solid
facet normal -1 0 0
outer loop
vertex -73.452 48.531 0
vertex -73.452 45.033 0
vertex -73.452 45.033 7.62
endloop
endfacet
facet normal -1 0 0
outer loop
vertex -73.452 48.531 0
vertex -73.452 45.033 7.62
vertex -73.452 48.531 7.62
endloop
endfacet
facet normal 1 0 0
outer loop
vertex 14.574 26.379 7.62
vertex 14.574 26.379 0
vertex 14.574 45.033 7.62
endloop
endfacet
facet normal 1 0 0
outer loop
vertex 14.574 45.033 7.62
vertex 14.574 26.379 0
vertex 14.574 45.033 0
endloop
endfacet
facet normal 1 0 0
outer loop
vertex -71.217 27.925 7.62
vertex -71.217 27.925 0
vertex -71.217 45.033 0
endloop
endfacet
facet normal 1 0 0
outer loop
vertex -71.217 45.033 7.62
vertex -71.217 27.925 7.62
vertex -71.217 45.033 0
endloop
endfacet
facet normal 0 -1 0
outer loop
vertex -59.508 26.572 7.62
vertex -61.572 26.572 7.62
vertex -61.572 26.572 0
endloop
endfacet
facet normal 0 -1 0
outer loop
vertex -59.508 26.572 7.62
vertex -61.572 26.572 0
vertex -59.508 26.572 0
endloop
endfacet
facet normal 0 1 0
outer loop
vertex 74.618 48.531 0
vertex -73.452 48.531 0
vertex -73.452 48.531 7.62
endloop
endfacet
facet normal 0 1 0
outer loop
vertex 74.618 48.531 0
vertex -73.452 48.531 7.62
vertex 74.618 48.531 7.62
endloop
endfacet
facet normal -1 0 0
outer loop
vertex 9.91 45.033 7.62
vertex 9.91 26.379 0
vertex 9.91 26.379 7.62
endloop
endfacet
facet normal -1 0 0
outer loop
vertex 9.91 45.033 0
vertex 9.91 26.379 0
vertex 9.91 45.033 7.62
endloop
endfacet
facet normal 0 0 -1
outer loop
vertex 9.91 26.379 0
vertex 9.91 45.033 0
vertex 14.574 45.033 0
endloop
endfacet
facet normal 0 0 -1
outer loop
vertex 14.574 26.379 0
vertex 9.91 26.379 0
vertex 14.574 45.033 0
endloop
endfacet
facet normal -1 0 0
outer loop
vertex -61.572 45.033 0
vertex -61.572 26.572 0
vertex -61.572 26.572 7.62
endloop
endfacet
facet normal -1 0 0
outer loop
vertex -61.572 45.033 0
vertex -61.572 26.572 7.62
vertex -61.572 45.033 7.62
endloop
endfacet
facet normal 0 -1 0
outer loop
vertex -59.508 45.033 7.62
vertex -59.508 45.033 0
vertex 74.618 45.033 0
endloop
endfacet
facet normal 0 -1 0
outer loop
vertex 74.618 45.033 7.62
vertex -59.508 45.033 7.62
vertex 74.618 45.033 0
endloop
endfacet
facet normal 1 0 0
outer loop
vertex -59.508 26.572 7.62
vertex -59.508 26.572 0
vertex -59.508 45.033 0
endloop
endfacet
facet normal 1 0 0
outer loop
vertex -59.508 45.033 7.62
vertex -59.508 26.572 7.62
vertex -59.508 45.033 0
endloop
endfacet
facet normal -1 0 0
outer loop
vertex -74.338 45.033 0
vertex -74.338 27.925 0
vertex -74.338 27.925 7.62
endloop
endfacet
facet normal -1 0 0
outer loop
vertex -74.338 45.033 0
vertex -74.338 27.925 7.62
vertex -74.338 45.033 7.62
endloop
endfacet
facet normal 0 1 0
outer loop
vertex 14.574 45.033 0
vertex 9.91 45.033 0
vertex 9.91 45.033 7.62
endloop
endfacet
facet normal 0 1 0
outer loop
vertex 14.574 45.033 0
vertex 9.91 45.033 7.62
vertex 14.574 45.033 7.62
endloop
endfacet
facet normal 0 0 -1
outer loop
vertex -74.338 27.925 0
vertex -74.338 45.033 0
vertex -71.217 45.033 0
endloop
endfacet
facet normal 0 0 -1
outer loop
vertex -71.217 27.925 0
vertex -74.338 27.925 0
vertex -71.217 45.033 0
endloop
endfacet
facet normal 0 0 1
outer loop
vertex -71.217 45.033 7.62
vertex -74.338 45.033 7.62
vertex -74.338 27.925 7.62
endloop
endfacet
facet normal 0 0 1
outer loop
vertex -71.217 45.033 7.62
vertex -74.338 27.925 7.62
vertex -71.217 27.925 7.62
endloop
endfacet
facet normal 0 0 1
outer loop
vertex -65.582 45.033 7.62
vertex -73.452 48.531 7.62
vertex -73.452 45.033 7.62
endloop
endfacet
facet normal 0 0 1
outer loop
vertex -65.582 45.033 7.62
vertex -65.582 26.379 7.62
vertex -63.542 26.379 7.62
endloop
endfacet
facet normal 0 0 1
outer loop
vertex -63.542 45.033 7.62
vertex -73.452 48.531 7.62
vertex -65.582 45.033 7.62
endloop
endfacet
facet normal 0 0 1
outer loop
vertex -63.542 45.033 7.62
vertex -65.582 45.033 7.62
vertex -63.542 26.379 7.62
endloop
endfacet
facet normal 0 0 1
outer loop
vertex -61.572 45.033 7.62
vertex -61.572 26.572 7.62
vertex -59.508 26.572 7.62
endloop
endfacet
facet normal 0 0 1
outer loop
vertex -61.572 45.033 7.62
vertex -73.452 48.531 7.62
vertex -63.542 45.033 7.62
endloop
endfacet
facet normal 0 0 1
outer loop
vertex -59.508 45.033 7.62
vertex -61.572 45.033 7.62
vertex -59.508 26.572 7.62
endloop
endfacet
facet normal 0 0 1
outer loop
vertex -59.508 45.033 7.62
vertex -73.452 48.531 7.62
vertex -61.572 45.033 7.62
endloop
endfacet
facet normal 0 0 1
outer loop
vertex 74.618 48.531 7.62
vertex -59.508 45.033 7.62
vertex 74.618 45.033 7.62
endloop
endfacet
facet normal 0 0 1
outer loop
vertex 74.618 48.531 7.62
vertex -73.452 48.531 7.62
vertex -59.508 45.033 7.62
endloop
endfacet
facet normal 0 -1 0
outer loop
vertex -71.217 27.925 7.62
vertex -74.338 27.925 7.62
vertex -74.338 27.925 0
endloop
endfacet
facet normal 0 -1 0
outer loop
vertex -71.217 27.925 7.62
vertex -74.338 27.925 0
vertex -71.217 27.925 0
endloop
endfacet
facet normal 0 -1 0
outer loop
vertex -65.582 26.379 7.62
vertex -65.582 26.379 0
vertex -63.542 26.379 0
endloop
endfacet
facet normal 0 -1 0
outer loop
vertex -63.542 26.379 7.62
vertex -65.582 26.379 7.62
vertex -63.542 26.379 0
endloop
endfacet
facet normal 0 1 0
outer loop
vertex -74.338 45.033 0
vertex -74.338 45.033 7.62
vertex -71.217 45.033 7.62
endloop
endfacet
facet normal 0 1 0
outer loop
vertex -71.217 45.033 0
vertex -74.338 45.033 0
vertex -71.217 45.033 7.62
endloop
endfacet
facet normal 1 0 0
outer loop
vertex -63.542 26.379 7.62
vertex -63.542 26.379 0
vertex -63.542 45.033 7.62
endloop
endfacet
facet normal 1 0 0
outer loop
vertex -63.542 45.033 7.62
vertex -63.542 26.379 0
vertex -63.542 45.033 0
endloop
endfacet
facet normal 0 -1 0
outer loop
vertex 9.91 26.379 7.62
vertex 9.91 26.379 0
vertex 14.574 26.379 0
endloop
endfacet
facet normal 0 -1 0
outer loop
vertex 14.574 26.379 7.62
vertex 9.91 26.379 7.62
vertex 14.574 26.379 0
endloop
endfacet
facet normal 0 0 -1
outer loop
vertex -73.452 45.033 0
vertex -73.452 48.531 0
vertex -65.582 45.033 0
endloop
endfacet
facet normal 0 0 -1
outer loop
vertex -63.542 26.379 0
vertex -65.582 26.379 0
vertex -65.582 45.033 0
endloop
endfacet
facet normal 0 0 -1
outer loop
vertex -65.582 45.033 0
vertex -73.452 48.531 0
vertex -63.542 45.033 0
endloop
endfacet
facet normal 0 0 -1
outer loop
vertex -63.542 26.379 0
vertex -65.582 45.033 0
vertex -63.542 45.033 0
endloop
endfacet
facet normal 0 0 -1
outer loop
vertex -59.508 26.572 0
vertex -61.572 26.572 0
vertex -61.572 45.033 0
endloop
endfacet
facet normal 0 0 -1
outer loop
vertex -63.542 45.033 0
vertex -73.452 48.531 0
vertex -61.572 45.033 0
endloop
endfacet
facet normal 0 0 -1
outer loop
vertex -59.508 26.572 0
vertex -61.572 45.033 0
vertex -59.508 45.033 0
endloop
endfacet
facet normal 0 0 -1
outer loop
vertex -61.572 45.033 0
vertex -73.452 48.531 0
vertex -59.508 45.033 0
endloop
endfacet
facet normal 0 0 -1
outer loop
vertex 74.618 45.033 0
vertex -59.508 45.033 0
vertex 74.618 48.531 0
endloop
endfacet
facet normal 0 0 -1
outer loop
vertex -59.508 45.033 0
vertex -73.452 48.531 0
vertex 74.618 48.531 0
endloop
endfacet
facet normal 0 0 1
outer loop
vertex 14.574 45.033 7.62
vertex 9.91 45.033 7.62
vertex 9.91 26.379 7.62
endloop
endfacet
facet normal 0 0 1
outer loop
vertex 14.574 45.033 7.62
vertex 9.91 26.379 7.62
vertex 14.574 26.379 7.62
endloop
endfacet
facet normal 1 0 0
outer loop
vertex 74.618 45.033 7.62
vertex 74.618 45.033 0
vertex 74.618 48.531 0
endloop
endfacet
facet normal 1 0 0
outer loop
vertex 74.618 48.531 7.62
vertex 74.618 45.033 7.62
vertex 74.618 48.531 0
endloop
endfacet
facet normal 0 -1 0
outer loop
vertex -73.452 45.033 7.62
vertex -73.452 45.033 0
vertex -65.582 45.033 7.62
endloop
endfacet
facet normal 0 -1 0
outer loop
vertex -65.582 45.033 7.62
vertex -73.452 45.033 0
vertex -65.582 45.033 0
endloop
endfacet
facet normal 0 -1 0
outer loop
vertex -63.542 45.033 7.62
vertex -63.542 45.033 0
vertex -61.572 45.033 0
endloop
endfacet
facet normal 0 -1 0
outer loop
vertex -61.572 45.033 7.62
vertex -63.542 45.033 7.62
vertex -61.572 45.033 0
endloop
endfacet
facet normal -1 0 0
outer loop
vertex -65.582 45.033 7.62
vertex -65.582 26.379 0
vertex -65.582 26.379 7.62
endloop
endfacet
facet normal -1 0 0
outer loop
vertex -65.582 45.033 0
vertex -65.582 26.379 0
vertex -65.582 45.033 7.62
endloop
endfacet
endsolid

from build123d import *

# Parameters (mm, degrees)
F0_W     = 148.069508
F0_H     = 3.497705
F1_DEPTH = 7.62
F2_W     = 3.121346
F2_H     = 17.1078
F3_DEPTH = 7.62
F4_W     = 4.663609
F4_H     = 18.654425
F5_DEPTH = 7.62
F6_W     = 2.040327
F6_H     = 18.654425
F7_DEPTH = 7.62
F8_W     = 2.064038
F8_H     = 18.461168
F9_DEPTH = 7.62


with BuildPart() as f1:
    # F0 (on Top) → F1 (new body)
    with BuildSketch(Plane.XY):
        with Locations((0.582952, 46.781804)):
            Rectangle(F0_W, F0_H)
    extrude(amount=F1_DEPTH)

    # F6 (on Top) → F7 (join)
    with BuildSketch(Plane.XY):
        with Locations((-64.561807, 35.705739)):
            Rectangle(F6_W, F6_H)
    extrude(amount=F7_DEPTH)

    # F8 (on Top) → F9 (join)
    with BuildSketch(Plane.XY):
        with Locations((-60.540417, 35.802368)):
            Rectangle(F8_W, F8_H)
    extrude(amount=F9_DEPTH)


with BuildPart() as f3:
    # F2 (on Top) → F3 (new body)
    with BuildSketch(Plane.XY):
        with Locations((-72.777592, 36.479052)):
            Rectangle(F2_W, F2_H)
    extrude(amount=F3_DEPTH)


with BuildPart() as f5:
    # F4 (on Top) → F5 (new body)
    with BuildSketch(Plane.XY):
        with Locations((12.241967, 35.705739)):
            Rectangle(F4_W, F4_H)
    extrude(amount=F5_DEPTH)


solid = Compound([f1.part, f3.part, f5.part])
